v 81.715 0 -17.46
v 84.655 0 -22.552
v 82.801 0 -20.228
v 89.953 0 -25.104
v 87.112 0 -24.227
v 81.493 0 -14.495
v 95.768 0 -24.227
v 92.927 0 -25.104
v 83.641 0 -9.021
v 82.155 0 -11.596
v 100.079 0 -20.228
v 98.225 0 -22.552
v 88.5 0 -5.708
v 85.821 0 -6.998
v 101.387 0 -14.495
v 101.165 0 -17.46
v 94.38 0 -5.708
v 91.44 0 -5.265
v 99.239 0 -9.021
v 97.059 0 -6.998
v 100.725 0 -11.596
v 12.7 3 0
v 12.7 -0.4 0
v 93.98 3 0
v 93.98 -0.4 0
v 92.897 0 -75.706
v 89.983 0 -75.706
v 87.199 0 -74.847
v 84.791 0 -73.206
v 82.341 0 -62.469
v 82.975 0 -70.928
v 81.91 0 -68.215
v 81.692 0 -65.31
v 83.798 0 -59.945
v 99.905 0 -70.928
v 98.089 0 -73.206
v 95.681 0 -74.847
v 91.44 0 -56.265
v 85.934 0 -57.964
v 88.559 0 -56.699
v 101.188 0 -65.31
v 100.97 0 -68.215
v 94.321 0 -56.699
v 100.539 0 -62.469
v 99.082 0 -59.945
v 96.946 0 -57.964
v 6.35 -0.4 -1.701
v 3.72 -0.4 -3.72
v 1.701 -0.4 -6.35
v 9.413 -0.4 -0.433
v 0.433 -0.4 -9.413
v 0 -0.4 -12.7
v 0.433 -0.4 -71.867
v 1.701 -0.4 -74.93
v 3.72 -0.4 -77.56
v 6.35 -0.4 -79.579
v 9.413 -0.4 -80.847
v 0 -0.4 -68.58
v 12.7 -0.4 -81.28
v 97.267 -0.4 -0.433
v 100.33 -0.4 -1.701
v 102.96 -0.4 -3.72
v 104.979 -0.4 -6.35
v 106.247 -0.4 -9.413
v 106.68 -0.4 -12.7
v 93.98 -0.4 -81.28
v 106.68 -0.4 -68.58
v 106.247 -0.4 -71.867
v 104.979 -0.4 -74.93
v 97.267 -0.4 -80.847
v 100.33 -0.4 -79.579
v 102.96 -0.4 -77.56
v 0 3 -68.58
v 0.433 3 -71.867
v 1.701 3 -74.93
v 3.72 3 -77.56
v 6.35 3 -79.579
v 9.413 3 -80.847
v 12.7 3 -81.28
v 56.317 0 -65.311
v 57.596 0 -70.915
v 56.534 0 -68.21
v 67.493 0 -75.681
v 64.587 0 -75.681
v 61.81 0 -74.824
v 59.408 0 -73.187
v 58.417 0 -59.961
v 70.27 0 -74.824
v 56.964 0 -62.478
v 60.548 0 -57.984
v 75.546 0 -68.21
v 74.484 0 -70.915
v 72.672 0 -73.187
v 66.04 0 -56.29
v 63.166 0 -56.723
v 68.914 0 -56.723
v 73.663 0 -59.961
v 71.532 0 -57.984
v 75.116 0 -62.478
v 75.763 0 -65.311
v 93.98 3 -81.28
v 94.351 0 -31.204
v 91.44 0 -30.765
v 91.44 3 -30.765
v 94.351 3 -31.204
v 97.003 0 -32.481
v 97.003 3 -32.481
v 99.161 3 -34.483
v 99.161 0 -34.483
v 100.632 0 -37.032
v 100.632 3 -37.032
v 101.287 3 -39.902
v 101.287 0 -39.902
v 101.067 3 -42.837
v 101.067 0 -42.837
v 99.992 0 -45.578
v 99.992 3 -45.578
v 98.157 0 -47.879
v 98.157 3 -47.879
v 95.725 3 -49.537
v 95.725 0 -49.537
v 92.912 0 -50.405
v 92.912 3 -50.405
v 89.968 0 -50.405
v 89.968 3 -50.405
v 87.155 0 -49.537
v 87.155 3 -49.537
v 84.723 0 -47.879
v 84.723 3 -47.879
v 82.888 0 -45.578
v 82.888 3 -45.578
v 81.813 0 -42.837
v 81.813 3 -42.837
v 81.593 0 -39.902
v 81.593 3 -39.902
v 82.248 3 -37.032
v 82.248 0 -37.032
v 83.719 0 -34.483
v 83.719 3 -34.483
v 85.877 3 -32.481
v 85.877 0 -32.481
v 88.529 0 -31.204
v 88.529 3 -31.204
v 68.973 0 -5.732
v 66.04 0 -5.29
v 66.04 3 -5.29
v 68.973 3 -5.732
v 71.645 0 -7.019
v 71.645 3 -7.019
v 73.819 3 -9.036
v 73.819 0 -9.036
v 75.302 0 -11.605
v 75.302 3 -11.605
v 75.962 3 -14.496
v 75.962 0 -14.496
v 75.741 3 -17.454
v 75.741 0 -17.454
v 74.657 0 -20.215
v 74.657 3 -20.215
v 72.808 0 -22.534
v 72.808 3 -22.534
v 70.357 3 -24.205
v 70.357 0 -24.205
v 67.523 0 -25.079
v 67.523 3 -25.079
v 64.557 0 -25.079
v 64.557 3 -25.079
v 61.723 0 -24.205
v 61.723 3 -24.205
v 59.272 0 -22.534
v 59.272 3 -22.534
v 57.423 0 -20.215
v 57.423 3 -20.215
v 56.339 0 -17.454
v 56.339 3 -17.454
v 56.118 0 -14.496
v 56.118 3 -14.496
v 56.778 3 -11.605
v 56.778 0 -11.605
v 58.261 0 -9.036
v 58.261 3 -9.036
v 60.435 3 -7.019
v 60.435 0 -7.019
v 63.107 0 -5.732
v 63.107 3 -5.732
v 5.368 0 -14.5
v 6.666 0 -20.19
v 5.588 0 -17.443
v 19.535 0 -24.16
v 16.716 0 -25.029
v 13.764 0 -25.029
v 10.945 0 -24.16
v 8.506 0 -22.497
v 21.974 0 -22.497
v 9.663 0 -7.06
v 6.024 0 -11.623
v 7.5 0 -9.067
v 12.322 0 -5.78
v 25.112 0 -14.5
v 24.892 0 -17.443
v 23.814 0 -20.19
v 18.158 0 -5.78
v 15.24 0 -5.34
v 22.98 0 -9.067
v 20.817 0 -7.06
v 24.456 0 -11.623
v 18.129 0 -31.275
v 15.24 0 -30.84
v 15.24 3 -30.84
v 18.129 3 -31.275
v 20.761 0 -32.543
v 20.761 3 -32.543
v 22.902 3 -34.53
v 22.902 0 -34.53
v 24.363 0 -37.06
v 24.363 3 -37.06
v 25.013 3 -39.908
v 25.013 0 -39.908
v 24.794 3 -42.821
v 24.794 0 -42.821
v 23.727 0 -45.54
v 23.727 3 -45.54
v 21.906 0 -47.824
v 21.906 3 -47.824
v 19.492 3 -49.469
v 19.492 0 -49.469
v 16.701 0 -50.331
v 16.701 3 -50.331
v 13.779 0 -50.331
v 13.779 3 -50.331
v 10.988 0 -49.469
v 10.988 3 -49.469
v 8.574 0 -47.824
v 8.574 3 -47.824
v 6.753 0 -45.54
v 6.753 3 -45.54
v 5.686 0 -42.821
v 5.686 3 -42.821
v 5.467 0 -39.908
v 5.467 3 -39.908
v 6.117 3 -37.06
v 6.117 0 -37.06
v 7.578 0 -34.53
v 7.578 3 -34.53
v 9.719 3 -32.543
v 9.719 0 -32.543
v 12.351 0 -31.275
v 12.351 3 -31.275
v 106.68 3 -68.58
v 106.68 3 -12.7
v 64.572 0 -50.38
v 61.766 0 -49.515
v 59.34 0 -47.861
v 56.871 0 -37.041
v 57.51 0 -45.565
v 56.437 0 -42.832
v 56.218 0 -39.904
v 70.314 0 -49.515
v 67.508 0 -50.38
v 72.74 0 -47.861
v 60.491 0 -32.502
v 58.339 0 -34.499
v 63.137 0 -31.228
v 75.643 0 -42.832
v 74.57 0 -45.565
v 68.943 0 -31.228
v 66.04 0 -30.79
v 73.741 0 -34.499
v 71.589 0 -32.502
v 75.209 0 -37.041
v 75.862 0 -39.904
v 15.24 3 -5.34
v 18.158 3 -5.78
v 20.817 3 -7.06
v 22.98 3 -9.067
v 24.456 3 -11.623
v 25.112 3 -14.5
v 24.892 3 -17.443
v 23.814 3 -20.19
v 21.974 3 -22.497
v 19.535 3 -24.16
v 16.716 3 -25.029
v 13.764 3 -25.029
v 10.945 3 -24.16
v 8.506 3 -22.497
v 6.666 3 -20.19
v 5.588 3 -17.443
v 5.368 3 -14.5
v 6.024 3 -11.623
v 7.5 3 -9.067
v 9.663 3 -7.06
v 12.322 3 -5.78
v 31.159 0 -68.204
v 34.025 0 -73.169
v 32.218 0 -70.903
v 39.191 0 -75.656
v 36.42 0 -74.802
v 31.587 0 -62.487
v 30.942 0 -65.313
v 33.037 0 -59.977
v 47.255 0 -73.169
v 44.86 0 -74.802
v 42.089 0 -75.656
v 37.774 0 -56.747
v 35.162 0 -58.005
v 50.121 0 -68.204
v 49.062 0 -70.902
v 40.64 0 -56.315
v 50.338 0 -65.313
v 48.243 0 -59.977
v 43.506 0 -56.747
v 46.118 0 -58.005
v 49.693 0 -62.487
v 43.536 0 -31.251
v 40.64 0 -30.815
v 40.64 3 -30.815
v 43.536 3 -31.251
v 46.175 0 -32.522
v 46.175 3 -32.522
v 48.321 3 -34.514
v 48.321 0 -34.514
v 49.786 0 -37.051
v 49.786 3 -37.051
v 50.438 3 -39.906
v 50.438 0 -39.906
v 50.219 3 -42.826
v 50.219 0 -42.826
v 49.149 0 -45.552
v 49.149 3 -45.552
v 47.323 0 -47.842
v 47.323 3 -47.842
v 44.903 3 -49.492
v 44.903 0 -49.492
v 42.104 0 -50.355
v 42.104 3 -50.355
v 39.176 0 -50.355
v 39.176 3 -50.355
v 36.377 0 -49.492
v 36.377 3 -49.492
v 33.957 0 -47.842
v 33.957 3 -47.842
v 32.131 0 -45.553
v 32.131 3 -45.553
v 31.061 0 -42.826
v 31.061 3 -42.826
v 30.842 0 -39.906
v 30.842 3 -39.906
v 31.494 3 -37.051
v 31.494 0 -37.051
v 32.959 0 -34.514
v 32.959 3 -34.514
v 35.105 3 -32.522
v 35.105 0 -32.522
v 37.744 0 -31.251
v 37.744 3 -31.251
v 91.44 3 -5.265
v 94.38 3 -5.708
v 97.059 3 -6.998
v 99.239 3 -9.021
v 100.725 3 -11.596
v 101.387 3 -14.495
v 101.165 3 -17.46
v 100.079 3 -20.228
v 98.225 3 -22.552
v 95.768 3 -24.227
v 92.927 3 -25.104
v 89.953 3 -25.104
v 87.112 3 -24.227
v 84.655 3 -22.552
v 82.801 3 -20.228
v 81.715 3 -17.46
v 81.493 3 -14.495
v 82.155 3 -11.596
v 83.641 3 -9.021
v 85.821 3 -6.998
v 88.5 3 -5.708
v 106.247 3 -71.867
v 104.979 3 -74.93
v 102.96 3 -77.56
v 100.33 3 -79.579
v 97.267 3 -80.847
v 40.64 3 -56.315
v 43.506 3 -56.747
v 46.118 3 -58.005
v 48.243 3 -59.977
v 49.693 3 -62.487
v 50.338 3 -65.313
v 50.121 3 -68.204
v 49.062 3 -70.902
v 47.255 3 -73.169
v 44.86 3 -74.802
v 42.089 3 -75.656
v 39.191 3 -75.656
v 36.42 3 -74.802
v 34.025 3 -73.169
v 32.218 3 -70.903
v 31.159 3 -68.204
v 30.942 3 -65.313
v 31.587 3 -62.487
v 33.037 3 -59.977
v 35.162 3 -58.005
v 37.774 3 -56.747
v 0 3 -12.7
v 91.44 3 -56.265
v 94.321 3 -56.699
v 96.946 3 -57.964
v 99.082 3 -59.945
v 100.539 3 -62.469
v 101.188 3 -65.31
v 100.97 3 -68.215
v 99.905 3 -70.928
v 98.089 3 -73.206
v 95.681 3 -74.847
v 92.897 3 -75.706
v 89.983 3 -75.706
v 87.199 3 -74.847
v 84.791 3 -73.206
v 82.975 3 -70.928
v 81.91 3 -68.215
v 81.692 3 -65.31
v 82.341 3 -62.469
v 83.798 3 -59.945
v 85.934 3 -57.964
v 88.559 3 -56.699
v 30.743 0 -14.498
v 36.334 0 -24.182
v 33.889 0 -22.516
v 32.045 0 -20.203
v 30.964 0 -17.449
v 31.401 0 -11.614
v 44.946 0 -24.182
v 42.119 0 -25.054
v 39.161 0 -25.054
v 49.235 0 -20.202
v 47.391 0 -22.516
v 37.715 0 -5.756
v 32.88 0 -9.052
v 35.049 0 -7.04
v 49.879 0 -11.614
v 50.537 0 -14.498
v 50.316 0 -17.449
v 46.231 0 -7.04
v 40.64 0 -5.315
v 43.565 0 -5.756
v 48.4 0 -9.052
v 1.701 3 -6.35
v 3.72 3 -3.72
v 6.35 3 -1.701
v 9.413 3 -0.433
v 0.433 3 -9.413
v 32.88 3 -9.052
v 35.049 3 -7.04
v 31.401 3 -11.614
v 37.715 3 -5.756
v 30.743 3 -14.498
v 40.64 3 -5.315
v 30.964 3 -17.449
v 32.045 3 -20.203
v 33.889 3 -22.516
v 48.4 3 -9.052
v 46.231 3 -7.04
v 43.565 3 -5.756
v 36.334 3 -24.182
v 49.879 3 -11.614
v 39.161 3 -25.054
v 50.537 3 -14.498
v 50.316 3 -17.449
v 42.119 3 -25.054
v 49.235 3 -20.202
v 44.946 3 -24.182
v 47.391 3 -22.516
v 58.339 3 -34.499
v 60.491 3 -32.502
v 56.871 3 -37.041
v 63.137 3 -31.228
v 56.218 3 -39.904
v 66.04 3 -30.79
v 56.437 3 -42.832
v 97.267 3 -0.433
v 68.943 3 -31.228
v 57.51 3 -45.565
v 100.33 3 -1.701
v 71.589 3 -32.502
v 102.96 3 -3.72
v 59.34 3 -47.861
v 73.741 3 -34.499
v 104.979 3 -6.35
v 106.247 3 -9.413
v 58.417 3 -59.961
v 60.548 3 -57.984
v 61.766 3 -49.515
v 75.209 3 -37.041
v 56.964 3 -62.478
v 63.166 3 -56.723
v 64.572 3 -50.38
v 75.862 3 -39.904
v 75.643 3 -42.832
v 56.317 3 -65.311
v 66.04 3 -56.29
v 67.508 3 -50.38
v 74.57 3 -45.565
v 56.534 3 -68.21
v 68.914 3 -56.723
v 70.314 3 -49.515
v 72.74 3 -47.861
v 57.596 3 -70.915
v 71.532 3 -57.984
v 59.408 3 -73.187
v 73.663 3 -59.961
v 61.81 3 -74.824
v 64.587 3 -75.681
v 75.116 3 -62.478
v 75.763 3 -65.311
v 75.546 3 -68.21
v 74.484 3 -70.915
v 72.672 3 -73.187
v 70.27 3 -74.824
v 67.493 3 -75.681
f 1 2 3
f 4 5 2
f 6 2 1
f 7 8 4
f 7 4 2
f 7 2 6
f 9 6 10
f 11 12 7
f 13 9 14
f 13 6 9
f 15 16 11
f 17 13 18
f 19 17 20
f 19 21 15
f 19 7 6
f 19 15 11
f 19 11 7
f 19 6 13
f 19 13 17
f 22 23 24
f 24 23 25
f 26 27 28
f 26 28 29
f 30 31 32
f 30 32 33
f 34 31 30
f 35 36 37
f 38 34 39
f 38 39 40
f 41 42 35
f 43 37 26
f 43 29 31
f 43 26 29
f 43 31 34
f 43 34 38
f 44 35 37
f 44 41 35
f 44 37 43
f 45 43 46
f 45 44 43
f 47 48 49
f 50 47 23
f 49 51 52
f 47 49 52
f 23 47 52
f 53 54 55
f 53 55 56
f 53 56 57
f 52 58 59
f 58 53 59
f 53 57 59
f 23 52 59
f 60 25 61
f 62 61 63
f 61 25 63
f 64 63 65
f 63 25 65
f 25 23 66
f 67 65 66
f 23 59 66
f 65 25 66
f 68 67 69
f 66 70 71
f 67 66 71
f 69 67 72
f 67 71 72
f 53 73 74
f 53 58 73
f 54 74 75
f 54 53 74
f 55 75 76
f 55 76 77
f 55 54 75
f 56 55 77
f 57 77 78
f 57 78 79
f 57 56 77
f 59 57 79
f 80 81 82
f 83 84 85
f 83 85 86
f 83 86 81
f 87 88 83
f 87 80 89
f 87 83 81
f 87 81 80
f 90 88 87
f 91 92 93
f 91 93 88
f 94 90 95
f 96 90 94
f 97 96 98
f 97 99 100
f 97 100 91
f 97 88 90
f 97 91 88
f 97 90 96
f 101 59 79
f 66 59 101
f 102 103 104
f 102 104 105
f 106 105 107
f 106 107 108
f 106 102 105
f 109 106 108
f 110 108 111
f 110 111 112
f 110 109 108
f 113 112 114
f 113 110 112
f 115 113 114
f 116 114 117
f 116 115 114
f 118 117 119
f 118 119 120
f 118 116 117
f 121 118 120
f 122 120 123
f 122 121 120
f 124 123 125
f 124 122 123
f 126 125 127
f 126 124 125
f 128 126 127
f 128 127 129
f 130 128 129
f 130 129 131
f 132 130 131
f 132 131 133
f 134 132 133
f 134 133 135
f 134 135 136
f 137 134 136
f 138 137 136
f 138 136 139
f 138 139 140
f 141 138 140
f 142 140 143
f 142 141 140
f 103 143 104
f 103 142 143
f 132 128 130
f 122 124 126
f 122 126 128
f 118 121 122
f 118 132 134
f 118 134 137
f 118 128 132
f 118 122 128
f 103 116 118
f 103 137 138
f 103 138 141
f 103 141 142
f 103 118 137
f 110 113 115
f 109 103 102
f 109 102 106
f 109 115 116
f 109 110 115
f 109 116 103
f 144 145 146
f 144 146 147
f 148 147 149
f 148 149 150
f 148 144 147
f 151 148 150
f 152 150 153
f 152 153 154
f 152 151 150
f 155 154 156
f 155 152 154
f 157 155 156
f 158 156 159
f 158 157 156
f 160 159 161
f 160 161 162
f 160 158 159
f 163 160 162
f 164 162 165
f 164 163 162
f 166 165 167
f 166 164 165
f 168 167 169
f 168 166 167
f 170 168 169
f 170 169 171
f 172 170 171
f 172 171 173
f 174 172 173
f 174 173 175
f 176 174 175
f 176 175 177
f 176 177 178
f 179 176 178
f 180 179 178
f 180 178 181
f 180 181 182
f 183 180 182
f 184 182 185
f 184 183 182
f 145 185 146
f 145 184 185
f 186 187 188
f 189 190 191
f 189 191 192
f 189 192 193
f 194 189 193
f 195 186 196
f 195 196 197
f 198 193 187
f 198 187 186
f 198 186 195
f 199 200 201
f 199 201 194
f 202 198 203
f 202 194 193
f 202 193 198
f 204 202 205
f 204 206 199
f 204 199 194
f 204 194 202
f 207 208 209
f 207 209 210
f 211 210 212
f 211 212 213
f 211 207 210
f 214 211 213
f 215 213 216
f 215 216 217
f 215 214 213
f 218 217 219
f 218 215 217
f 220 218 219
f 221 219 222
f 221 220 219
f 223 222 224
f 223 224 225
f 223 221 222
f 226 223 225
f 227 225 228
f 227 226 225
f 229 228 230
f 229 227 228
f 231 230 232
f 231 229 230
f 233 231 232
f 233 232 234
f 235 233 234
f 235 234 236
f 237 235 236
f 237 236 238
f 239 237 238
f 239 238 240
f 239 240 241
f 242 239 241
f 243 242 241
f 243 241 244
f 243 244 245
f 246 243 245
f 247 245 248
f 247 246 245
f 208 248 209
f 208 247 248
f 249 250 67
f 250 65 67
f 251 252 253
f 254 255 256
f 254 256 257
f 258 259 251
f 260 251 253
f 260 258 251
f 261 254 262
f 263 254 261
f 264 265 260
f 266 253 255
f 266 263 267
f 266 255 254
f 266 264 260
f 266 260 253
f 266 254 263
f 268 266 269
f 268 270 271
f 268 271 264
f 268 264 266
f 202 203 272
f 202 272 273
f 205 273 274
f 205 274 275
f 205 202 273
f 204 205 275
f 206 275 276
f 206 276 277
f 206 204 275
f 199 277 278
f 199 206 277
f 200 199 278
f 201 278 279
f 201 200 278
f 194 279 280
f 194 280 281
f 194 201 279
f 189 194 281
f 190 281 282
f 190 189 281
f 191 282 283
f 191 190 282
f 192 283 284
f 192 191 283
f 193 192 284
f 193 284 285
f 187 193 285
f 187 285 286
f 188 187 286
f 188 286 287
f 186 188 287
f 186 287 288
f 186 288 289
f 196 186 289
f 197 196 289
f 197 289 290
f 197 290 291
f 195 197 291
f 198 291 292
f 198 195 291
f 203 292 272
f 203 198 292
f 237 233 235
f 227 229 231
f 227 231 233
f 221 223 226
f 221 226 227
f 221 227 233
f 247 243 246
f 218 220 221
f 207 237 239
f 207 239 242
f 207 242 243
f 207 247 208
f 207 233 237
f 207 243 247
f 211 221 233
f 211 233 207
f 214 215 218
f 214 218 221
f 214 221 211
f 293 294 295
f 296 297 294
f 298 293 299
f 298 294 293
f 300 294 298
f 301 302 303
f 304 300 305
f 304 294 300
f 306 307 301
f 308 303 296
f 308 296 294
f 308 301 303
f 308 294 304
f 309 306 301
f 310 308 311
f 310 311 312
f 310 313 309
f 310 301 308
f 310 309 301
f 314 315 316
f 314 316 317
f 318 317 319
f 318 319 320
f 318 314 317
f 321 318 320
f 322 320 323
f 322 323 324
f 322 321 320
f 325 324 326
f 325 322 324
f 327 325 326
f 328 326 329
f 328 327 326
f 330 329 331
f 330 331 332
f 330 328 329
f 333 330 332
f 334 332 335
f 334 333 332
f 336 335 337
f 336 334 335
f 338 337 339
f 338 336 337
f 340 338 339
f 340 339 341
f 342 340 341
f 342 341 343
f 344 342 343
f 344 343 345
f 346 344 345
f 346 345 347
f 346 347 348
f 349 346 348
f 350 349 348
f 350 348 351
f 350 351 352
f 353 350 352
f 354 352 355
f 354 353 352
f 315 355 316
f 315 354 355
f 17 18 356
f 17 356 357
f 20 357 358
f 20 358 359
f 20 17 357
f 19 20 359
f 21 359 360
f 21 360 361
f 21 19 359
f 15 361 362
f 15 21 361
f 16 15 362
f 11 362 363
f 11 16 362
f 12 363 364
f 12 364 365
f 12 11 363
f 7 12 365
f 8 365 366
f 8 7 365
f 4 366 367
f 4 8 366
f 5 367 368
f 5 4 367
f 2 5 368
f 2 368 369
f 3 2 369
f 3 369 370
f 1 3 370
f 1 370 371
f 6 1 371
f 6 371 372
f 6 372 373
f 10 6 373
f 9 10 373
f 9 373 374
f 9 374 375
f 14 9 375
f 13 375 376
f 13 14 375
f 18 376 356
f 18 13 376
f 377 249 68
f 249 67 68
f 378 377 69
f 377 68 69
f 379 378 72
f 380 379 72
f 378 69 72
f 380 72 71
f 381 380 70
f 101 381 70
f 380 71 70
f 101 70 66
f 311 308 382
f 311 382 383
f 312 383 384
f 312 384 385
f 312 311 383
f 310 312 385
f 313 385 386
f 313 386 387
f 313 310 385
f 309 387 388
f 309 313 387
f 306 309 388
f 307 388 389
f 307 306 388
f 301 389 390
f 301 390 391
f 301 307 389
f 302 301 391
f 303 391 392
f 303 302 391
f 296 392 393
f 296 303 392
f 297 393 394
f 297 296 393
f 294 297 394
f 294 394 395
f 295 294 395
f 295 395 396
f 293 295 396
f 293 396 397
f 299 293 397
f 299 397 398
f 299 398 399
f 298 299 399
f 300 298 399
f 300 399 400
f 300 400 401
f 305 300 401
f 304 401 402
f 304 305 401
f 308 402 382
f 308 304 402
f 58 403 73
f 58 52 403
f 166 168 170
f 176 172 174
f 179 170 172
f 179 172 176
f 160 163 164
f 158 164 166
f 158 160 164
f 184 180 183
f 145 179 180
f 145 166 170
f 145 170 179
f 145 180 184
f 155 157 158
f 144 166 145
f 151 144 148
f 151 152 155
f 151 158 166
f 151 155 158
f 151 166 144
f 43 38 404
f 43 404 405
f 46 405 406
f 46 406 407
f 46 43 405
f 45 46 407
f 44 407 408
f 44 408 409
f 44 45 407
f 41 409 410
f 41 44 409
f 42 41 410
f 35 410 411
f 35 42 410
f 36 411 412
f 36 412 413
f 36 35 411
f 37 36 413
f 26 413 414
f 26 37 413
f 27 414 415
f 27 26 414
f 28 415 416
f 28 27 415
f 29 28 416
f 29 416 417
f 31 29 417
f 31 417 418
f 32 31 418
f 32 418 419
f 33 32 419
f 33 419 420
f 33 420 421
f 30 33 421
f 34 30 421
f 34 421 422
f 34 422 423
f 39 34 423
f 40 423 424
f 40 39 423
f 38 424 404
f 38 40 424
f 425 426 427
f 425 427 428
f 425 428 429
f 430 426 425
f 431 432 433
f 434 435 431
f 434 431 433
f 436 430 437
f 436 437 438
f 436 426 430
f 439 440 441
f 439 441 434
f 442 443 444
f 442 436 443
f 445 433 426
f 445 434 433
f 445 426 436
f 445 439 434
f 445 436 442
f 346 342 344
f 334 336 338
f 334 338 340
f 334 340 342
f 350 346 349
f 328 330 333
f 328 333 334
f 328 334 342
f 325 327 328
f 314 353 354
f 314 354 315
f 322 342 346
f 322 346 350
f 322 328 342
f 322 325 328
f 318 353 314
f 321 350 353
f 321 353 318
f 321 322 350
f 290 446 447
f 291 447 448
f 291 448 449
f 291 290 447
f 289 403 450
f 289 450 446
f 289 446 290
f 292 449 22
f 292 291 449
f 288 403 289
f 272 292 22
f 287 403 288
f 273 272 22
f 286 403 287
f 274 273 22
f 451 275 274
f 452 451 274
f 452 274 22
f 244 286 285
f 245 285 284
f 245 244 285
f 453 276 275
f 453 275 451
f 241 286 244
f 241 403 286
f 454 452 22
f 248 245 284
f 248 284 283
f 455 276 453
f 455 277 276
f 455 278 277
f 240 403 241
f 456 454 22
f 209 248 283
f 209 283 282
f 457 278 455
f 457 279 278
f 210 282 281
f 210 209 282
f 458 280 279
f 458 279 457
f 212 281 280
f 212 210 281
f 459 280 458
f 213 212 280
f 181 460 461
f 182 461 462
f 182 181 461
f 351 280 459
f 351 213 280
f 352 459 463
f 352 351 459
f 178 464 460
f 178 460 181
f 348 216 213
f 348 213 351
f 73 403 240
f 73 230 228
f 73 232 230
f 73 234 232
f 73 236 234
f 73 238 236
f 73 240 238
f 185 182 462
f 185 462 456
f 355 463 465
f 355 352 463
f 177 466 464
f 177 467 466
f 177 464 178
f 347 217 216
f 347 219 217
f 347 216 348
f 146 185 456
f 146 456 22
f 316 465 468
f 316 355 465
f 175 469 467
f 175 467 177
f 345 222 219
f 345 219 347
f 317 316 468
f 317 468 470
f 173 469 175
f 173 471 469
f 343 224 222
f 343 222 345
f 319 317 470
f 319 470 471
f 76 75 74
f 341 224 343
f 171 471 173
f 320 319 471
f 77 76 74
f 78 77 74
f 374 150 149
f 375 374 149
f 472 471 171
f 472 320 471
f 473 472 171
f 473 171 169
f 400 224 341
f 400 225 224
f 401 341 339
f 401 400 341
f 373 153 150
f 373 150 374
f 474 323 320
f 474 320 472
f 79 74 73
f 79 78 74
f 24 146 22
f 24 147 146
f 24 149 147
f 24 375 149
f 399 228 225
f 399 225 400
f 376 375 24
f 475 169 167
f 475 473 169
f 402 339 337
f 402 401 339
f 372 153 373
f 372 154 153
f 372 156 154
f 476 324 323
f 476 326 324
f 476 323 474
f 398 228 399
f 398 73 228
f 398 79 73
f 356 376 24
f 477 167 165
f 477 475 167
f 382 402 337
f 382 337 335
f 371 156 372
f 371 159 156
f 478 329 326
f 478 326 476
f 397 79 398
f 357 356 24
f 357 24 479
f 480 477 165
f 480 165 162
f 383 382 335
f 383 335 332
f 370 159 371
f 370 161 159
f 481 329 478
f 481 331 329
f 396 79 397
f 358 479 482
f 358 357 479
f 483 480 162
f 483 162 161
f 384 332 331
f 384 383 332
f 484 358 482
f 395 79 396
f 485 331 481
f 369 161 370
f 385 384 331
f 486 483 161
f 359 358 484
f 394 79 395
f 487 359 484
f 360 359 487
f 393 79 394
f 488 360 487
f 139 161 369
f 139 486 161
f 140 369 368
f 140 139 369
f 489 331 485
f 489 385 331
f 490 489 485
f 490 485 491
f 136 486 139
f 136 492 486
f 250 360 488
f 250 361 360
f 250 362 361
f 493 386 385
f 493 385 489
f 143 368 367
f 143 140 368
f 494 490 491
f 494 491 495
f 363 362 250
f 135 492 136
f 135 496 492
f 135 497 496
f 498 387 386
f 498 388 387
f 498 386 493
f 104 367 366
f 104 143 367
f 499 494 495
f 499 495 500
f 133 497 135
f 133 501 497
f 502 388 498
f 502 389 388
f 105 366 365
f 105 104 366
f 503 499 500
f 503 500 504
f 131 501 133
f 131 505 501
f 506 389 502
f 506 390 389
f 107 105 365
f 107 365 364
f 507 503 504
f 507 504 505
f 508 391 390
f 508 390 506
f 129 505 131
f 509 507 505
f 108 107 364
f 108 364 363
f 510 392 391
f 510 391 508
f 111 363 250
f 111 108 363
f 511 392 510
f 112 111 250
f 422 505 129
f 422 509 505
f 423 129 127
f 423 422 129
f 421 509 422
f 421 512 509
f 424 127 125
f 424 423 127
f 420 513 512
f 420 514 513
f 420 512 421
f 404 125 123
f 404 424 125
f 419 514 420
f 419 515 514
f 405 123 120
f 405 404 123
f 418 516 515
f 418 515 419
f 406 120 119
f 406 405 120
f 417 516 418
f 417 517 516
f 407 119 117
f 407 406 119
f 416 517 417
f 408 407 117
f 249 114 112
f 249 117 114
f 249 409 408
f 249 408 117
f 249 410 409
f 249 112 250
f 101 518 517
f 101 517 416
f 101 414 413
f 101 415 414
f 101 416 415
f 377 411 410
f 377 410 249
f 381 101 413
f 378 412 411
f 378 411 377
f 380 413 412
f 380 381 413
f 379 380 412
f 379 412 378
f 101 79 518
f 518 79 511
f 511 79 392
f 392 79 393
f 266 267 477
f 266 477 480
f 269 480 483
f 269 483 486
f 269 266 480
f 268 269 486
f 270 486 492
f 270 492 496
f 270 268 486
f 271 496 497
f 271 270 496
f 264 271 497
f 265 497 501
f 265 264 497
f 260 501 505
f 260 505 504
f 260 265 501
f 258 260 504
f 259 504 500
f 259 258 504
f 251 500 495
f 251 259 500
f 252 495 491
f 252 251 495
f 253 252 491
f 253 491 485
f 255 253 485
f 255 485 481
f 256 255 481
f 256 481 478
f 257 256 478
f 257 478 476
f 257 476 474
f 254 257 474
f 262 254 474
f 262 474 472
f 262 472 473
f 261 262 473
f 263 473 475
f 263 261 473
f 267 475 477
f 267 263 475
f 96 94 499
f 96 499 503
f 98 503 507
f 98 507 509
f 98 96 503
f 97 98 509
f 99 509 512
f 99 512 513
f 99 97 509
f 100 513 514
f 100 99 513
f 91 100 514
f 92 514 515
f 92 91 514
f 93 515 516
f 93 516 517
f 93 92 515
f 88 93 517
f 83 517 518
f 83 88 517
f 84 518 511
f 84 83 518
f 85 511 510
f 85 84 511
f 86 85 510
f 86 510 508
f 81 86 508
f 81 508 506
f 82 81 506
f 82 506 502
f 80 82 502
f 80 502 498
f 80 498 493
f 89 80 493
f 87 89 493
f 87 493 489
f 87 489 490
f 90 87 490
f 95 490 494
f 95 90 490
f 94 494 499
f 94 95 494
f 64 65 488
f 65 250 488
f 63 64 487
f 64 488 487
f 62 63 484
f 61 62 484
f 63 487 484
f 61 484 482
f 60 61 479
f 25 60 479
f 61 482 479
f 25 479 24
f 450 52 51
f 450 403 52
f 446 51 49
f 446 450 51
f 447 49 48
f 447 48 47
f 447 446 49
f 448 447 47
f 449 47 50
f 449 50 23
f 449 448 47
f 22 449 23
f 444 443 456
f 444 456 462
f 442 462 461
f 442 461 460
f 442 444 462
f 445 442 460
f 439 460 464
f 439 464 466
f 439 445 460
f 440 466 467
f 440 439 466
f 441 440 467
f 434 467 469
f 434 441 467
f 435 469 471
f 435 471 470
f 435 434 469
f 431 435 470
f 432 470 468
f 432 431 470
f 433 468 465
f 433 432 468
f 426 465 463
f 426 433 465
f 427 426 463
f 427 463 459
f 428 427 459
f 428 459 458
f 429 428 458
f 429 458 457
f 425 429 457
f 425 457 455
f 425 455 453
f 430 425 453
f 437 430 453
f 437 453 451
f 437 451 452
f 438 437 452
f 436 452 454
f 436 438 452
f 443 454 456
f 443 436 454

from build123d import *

# Parameters (mm, degrees)
SKETCH1_W           = 106.68
SKETCH1_H           = 81.28
SKETCH1_R           = 9.8
SKETCH1_R_2         = 9.825
SKETCH1_R_3         = 9.85
SKETCH1_R_4         = 9.875
SKETCH1_R_5         = 9.9
SKETCH1_R_6         = 9.925
SKETCH1_R_7         = 9.95
SKETCH1_R_8         = 9.975
SKETCH1_R_9         = 9.775
SKETCH1_R_10        = 9.75
SKETCH1_R_11        = 9.725
BOSS_EXTRUDE1_DEPTH = 3
SKETCH1_2_W         = 106.68
SKETCH1_2_H         = 81.28
BOSS_EXTRUDE2_DEPTH = 0.4
FILLET1_R           = 12.7


with BuildPart() as part:
    # Sketch1 → Boss-Extrude1 (new body)
    with BuildSketch(Plane(origin=(0, 0, 0), x_dir=(1, 0, 0), z_dir=(0, 1, 0))):
        with Locations((53.34, 40.64)):
            Rectangle(SKETCH1_W, SKETCH1_H)
        with Locations((15.24, 40.64)):
            Circle(SKETCH1_R, mode=Mode.SUBTRACT)
        with Locations((40.64, 40.64)):
            Circle(SKETCH1_R_2, mode=Mode.SUBTRACT)
        with Locations((66.04, 40.64)):
            Circle(SKETCH1_R_3, mode=Mode.SUBTRACT)
        with Locations((91.44, 40.64)):
            Circle(SKETCH1_R_4, mode=Mode.SUBTRACT)
        with Locations((15.24, 15.24)):
            Circle(SKETCH1_R_5, mode=Mode.SUBTRACT)
        with Locations((40.64, 15.24)):
            Circle(SKETCH1_R_6, mode=Mode.SUBTRACT)
        with Locations((66.04, 15.24)):
            Circle(SKETCH1_R_7, mode=Mode.SUBTRACT)
        with Locations((91.44, 15.24)):
            Circle(SKETCH1_R_8, mode=Mode.SUBTRACT)
        with Locations((91.44, 66.04)):
            Circle(SKETCH1_R_9, mode=Mode.SUBTRACT)
        with Locations((66.04, 66.04)):
            Circle(SKETCH1_R_10, mode=Mode.SUBTRACT)
        with Locations((40.64, 66.04)):
            Circle(SKETCH1_R_11, mode=Mode.SUBTRACT)
    extrude(amount=BOSS_EXTRUDE1_DEPTH)

    # Sketch1<2> → Boss-Extrude2 (add)
    with BuildSketch(Plane(origin=(0, 0, 0), x_dir=(1, 0, 0), z_dir=(0, 1, 0))):
        with Locations((53.34, 40.64)):
            Rectangle(SKETCH1_2_W, SKETCH1_2_H)
    extrude(amount=-BOSS_EXTRUDE2_DEPTH)

    # Fillet1
    fillet1_edges = [part.edges().sort_by_distance(p)[0] for p in [
        (0, 1.3, -81.28),
        (106.68, 1.3, -81.28),
        (106.68, 1.3, 0),
        (0, 1.3, 0),
    ]]
    fillet(fillet1_edges, radius=FILLET1_R)


solid = part.part
